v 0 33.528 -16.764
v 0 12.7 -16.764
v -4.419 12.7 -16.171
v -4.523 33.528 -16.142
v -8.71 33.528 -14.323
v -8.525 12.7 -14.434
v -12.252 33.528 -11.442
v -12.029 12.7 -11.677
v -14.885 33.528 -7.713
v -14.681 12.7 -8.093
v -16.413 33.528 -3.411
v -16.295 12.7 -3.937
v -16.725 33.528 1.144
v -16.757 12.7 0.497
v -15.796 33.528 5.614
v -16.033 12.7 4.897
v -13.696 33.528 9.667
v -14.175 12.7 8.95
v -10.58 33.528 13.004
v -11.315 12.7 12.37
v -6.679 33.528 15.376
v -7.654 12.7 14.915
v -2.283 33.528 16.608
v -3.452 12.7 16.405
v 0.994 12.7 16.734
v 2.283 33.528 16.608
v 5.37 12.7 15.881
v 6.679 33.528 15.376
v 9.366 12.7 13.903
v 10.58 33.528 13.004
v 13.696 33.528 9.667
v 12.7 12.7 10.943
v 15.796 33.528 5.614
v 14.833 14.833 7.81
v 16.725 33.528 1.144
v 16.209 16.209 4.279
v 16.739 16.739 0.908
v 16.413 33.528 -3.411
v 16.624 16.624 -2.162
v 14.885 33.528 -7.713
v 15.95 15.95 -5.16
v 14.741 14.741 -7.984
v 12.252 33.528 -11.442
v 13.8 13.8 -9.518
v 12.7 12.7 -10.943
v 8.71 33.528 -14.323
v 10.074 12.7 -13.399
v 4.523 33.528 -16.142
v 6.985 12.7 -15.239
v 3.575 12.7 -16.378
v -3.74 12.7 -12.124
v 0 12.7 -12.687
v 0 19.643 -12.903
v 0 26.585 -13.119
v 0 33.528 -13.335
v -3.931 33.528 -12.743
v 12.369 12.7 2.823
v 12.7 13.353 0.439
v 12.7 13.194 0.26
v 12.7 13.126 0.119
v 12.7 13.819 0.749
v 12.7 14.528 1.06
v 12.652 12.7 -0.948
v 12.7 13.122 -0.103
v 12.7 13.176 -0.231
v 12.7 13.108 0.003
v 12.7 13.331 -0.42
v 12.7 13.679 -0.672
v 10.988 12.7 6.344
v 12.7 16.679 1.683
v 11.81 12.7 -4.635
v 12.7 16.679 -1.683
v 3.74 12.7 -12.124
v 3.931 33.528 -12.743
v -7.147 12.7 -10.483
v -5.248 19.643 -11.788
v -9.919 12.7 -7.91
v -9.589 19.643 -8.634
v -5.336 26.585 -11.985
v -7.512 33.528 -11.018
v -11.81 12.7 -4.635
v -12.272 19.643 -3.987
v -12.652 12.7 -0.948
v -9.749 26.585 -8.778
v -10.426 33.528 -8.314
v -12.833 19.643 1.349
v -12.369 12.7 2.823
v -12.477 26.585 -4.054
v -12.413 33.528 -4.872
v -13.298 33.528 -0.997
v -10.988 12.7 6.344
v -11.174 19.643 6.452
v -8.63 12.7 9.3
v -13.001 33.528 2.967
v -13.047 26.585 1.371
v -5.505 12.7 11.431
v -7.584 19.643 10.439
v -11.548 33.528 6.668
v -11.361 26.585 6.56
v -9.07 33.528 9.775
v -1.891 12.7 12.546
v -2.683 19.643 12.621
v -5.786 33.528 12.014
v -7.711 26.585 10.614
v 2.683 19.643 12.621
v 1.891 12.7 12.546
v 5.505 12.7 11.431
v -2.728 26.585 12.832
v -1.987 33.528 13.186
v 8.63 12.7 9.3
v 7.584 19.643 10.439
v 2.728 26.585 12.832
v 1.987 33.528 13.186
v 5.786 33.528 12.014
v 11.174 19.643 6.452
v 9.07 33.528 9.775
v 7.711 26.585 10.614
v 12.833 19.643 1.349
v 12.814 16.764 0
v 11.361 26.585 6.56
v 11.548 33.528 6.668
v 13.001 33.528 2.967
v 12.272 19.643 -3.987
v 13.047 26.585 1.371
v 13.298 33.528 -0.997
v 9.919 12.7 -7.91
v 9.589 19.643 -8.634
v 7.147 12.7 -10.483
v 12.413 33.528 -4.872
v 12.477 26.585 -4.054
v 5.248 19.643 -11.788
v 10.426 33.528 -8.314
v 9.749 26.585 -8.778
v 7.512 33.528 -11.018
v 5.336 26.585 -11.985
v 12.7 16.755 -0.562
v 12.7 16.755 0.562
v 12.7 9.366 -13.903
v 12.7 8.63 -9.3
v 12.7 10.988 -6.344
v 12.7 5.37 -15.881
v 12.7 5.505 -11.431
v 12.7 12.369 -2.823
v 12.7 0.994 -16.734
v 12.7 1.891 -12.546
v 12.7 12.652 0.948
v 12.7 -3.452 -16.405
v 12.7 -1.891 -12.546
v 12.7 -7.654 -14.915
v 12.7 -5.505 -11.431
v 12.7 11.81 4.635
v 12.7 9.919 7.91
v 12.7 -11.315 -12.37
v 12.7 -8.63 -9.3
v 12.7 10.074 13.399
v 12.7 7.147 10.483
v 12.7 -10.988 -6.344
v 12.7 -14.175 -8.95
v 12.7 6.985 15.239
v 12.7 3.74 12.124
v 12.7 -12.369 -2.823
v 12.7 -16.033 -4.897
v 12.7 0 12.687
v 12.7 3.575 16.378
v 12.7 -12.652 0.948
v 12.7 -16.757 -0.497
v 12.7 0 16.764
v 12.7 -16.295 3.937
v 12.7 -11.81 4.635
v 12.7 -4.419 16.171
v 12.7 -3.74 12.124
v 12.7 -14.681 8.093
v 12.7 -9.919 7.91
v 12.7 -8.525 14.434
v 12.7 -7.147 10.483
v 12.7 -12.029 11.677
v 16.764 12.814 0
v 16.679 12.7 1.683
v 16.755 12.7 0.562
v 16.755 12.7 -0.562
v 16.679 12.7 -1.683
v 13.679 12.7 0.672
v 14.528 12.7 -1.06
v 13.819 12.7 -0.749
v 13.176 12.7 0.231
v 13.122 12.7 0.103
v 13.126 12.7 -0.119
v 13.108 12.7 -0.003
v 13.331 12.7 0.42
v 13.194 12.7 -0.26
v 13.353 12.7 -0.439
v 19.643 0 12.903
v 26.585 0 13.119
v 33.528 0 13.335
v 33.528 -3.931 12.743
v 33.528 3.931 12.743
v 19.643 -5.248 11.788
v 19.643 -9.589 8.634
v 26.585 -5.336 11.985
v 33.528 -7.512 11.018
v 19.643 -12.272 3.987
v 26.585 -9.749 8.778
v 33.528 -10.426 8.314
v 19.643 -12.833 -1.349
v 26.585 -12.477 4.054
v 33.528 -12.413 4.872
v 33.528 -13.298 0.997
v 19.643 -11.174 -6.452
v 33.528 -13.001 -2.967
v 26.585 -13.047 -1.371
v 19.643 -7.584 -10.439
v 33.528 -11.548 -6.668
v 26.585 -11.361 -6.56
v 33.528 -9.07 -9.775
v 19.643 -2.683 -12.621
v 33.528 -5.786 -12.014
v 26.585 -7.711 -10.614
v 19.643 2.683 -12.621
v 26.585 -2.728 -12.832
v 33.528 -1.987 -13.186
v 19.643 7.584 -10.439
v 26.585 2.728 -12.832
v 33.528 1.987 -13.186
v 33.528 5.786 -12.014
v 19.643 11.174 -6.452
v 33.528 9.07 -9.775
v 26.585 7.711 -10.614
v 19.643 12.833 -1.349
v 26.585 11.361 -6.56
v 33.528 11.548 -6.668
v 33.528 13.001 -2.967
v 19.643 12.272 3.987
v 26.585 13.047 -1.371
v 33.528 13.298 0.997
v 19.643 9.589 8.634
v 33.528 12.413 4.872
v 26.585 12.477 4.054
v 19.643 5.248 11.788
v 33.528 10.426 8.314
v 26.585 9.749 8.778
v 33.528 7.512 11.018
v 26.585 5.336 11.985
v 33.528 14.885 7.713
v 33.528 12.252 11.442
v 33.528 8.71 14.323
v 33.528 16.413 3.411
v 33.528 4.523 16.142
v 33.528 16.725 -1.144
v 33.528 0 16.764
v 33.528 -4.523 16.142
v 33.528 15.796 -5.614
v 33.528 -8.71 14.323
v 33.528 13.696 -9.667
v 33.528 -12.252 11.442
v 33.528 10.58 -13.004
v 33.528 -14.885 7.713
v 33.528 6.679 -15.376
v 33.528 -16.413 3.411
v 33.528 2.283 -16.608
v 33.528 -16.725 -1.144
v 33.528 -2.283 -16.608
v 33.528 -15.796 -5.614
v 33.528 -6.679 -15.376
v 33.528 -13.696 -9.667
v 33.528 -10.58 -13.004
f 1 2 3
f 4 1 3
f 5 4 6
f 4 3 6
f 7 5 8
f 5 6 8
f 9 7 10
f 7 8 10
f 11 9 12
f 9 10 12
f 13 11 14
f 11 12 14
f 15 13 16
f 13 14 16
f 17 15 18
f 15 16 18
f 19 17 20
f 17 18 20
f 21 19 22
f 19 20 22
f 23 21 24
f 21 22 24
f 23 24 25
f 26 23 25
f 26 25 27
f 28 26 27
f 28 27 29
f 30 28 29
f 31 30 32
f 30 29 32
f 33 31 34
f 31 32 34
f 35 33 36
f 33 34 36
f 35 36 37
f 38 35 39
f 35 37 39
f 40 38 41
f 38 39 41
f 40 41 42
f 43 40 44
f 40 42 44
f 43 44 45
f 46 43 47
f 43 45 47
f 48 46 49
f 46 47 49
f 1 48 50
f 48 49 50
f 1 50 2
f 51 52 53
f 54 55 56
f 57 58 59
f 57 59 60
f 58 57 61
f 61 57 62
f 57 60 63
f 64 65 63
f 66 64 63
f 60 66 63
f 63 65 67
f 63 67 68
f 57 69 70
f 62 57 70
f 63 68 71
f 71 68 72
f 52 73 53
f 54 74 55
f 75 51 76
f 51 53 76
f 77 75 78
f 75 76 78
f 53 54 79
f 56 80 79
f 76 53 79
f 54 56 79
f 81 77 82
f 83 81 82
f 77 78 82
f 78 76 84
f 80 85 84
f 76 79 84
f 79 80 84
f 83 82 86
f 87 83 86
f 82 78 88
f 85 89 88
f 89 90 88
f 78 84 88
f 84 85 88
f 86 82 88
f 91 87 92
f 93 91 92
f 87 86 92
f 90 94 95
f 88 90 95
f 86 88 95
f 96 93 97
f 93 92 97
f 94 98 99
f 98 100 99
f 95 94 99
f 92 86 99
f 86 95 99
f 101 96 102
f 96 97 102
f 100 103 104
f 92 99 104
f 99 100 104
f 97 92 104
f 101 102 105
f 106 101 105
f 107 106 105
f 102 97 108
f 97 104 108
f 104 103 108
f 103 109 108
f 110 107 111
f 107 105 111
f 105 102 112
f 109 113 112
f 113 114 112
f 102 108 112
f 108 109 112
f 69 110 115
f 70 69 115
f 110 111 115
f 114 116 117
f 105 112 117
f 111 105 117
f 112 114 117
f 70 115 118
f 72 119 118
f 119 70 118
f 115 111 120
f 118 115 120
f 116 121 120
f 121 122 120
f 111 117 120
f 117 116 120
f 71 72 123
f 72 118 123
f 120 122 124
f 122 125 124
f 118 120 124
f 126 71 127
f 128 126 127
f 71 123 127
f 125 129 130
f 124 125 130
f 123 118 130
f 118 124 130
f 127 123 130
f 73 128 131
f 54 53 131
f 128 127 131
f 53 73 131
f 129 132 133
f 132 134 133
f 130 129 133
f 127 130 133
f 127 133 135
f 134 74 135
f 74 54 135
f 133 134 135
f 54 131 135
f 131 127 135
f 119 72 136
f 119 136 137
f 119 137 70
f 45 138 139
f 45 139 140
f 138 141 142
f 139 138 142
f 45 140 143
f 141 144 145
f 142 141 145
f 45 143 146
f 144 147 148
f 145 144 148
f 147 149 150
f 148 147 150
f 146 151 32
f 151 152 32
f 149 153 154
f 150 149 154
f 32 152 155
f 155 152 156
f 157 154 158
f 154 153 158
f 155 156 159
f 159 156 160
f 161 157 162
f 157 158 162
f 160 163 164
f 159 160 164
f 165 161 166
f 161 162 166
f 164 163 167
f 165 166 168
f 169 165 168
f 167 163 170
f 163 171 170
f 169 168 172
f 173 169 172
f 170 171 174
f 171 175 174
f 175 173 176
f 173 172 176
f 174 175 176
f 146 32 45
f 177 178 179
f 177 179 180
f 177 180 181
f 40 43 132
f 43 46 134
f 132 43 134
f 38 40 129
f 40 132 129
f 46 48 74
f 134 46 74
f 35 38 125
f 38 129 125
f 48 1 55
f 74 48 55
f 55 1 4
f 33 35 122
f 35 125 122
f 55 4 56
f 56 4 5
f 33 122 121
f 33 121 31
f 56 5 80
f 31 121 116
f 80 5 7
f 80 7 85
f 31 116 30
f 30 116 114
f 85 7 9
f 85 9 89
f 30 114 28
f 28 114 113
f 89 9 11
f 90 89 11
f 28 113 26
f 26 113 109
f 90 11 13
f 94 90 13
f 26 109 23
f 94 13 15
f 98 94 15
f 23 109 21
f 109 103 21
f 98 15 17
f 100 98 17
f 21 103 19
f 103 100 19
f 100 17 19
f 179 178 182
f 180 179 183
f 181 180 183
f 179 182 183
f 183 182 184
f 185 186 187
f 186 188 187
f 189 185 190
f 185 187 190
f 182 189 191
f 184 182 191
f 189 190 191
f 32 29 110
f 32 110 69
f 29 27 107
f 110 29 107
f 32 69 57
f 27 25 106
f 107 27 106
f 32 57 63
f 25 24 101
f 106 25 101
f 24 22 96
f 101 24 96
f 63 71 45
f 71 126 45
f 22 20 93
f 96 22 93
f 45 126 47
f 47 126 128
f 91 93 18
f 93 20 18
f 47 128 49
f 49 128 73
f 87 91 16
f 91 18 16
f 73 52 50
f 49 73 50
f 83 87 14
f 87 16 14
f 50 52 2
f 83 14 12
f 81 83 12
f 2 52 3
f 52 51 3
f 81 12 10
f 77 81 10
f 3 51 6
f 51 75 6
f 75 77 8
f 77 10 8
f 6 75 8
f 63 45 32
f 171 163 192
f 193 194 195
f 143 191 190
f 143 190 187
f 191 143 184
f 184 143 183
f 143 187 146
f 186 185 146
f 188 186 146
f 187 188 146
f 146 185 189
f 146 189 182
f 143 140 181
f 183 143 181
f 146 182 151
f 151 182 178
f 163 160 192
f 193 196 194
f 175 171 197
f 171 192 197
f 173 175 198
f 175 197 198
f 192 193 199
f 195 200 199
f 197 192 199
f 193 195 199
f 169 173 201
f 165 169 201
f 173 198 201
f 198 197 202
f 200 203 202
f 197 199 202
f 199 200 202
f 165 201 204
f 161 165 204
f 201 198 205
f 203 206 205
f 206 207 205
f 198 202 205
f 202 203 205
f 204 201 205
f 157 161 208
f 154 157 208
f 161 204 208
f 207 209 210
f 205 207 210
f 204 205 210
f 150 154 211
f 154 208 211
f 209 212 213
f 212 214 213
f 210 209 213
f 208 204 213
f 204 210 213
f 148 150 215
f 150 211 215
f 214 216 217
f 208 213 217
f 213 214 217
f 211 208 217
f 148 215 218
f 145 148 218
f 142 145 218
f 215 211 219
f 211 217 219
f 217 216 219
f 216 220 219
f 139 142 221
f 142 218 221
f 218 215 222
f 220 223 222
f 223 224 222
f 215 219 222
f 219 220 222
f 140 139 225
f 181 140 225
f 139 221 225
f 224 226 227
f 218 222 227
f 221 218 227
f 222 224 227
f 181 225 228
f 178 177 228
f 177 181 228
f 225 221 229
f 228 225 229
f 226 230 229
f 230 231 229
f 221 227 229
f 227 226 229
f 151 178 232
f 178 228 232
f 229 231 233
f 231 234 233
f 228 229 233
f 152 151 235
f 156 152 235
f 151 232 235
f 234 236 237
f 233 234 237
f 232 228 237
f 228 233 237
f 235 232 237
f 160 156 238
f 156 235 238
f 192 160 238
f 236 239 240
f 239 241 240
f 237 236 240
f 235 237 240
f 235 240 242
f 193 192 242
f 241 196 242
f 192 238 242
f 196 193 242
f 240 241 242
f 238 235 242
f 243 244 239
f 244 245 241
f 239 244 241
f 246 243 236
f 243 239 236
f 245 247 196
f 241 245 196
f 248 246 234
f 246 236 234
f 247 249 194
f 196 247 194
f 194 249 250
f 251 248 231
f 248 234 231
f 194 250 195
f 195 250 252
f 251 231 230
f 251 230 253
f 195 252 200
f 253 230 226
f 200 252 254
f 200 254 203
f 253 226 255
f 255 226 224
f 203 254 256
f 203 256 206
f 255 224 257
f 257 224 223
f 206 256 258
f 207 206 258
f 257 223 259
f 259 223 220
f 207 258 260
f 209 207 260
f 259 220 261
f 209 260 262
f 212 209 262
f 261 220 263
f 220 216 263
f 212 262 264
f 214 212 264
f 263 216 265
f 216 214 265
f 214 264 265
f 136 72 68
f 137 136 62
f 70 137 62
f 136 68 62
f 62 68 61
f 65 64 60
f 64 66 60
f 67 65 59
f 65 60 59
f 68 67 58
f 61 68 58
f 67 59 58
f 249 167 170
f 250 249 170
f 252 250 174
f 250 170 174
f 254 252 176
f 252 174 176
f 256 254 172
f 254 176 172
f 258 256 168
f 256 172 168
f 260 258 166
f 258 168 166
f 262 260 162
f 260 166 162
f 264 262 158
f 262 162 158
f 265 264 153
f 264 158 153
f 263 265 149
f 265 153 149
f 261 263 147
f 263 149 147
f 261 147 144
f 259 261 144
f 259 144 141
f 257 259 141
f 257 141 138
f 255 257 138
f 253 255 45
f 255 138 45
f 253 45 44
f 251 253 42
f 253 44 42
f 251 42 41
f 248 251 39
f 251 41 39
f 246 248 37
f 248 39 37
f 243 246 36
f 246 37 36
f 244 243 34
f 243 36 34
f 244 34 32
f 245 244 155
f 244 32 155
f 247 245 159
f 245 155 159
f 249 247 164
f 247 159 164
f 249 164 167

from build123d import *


with BuildPart() as part:
    # Sketch1 → Revolve1 (revolve)
    with BuildSketch(Plane.XY, mode=Mode.PRIVATE) as revolve1_sk:
        Polygon((12.7, -12.6873), (33.528, -13.335), (33.528, -16.764), (12.7, -16.764), align=None)
    revolve(revolve1_sk.sketch.rotate(Axis((-22.402366391, 0, 0), (1, 0, 0)), 270), axis=Axis((-22.402366391, 0, 0), (1, 0, 0)))

    # Sketch2 → Revolve2 (revolve)
    with BuildSketch(Plane.XY, mode=Mode.PRIVATE) as revolve2_sk:
        Polygon((-16.764, 33.528), (-16.764, 12.7), (-12.6873, 12.7), (-13.335, 33.528), align=None)
    revolve(revolve2_sk.sketch.rotate(Axis((0, 0, 0), (0, 1, 0)), 270), axis=Axis((0, 0, 0), (0, 1, 0)))


solid = part.part
